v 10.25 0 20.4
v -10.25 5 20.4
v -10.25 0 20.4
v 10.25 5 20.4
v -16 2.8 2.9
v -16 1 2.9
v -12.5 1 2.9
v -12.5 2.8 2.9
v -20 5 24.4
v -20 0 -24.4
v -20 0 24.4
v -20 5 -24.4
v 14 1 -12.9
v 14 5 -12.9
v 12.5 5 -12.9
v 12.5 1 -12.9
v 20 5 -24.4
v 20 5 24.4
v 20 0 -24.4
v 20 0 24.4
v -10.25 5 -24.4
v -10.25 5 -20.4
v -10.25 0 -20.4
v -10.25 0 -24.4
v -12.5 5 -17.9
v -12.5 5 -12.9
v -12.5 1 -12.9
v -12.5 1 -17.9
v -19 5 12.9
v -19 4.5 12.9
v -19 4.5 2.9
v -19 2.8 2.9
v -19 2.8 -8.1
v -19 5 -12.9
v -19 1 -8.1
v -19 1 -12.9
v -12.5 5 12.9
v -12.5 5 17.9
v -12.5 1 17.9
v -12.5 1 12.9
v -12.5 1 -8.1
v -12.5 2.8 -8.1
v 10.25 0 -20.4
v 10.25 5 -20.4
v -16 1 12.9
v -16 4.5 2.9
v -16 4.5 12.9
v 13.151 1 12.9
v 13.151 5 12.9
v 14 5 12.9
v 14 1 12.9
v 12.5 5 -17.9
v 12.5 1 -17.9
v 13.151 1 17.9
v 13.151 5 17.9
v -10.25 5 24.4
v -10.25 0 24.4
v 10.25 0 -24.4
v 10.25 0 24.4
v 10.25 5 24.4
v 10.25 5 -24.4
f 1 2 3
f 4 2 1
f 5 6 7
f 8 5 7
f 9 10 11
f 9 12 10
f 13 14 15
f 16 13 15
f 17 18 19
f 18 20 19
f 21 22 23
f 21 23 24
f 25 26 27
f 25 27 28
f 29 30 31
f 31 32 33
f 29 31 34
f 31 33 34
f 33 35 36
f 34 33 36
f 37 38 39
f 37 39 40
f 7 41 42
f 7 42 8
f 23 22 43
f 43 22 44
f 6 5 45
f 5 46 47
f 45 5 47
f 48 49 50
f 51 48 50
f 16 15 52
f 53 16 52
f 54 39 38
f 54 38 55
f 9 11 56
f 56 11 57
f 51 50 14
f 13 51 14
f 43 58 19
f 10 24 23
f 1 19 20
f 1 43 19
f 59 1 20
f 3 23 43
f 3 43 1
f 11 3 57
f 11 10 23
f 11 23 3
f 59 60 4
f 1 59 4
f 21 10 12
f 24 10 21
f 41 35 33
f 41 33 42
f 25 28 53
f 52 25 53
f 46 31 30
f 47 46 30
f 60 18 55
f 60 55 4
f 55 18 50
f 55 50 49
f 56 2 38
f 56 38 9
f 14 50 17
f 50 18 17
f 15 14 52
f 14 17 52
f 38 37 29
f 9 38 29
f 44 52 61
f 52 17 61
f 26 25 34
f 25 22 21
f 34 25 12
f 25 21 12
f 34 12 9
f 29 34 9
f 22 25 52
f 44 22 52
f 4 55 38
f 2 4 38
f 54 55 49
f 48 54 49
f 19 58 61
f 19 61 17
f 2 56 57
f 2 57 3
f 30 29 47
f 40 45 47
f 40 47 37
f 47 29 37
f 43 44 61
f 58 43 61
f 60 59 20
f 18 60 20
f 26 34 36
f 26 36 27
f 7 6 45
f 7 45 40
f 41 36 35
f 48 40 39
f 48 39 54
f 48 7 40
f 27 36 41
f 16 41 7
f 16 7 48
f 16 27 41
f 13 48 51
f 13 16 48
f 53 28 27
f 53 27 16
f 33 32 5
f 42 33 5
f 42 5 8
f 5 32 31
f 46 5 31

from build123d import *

# Parameters (mm, degrees)
SKETCH1_W           = 40
SKETCH1_H           = 48.8
BOSS_EXTRUDE1_DEPTH = 1
SKETCH2_W           = 40
SKETCH2_H           = 48.8
SKETCH2_W_2         = 38
SKETCH2_H_2         = 35.8
BOSS_EXTRUDE2_DEPTH = 4
SKETCH3_W           = 20.5
SKETCH3_H           = 8
CUT_EXTRUDE1_DEPTH  = 6
BOSS_EXTRUDE3_REACH = 7
SKETCH4_W           = 6.5
SKETCH4_H           = 5
SKETCH5_W           = 7
SKETCH5_H           = 11
BOSS_EXTRUDE4_DEPTH = 2.8
SKETCH7_W           = 10
SKETCH7_H           = 4.5
BOSS_EXTRUDE5_DEPTH = 4


with BuildPart() as part:
    # Sketch1 → Boss-Extrude1 (new body)
    with BuildSketch(Plane(origin=(0, 0, 0), x_dir=(1, 0, 0), z_dir=(0, 1, 0))):
        Rectangle(SKETCH1_W, SKETCH1_H)
    extrude(amount=BOSS_EXTRUDE1_DEPTH)

    # Sketch2 → Boss-Extrude2 (add)
    with BuildSketch(Plane(origin=(0, 1, 0), x_dir=(1, 0, 0), z_dir=(0, 1, 0))):
        Rectangle(SKETCH2_W, SKETCH2_H)
        Rectangle(SKETCH2_W_2, SKETCH2_H_2, mode=Mode.SUBTRACT)
    extrude(amount=BOSS_EXTRUDE2_DEPTH)

    # Sketch3 → Cut-Extrude1 (cut, through all)
    with BuildSketch(Plane(origin=(0, 5, 0), x_dir=(1, 0, 0), z_dir=(0, 1, 0))):
        with Locations((0, -24.4)):
            Rectangle(SKETCH3_W, SKETCH3_H)
        with Locations((0, 24.4)):
            Rectangle(SKETCH3_W, SKETCH3_H)
    extrude(amount=-CUT_EXTRUDE1_DEPTH, mode=Mode.SUBTRACT)

    # Sketch4 → Boss-Extrude3 (add, up to next)
    with BuildSketch(Plane(origin=(0, 5, 0), x_dir=(1, 0, 0), z_dir=(0, 1, 0)), mode=Mode.PRIVATE) as boss_extrude3_sk1:
        with Locations((-15.75, -15.4)):
            Rectangle(SKETCH4_W, SKETCH4_H)
    boss_extrude3_tool1 = extrude(boss_extrude3_sk1.sketch, amount=-BOSS_EXTRUDE3_REACH, mode=Mode.PRIVATE) - part.part
    add(boss_extrude3_tool1.solids().sort_by_distance((-15.75, 5, 15.4))[0])
    # Sketch4 → Boss-Extrude3 (add, up to next)
    with BuildSketch(Plane(origin=(0, 5, 0), x_dir=(1, 0, 0), z_dir=(0, 1, 0)), mode=Mode.PRIVATE) as boss_extrude3_sk2:
        with Locations((-15.75, 15.4)):
            Rectangle(SKETCH4_W, SKETCH4_H)
    boss_extrude3_tool2 = extrude(boss_extrude3_sk2.sketch, amount=-BOSS_EXTRUDE3_REACH, mode=Mode.PRIVATE) - part.part
    add(boss_extrude3_tool2.solids().sort_by_distance((-15.75, 5, -15.4))[0])
    # Sketch4 → Boss-Extrude3 (add, up to next)
    with BuildSketch(Plane(origin=(0, 5, 0), x_dir=(1, 0, 0), z_dir=(0, 1, 0)), mode=Mode.PRIVATE) as boss_extrude3_sk3:
        Polygon((19, 17.9), (19, -17.9), (13.150842714, -17.9), (13.150842714, -12.9), (14, -12.9), (14, 12.9), (12.5, 12.9), (12.5, 17.9), align=None)
    boss_extrude3_tool3 = extrude(boss_extrude3_sk3.sketch, amount=-BOSS_EXTRUDE3_REACH, mode=Mode.PRIVATE) - part.part
    add(boss_extrude3_tool3.solids().sort_by_distance((16.307114, 5, -0.262731))[0])

    # Sketch5 → Boss-Extrude4 (add)
    with BuildSketch(Plane.XZ):
        with Locations((-16, -2.6)):
            Rectangle(SKETCH5_W, SKETCH5_H)
    extrude(amount=-BOSS_EXTRUDE4_DEPTH)

    # Sketch7 → Boss-Extrude5 (add)
    with BuildSketch(Plane.ZY.offset(20)):
        with Locations((7.9, 2.25)):
            Rectangle(SKETCH7_W, SKETCH7_H)
    extrude(amount=-BOSS_EXTRUDE5_DEPTH)


solid = part.part
